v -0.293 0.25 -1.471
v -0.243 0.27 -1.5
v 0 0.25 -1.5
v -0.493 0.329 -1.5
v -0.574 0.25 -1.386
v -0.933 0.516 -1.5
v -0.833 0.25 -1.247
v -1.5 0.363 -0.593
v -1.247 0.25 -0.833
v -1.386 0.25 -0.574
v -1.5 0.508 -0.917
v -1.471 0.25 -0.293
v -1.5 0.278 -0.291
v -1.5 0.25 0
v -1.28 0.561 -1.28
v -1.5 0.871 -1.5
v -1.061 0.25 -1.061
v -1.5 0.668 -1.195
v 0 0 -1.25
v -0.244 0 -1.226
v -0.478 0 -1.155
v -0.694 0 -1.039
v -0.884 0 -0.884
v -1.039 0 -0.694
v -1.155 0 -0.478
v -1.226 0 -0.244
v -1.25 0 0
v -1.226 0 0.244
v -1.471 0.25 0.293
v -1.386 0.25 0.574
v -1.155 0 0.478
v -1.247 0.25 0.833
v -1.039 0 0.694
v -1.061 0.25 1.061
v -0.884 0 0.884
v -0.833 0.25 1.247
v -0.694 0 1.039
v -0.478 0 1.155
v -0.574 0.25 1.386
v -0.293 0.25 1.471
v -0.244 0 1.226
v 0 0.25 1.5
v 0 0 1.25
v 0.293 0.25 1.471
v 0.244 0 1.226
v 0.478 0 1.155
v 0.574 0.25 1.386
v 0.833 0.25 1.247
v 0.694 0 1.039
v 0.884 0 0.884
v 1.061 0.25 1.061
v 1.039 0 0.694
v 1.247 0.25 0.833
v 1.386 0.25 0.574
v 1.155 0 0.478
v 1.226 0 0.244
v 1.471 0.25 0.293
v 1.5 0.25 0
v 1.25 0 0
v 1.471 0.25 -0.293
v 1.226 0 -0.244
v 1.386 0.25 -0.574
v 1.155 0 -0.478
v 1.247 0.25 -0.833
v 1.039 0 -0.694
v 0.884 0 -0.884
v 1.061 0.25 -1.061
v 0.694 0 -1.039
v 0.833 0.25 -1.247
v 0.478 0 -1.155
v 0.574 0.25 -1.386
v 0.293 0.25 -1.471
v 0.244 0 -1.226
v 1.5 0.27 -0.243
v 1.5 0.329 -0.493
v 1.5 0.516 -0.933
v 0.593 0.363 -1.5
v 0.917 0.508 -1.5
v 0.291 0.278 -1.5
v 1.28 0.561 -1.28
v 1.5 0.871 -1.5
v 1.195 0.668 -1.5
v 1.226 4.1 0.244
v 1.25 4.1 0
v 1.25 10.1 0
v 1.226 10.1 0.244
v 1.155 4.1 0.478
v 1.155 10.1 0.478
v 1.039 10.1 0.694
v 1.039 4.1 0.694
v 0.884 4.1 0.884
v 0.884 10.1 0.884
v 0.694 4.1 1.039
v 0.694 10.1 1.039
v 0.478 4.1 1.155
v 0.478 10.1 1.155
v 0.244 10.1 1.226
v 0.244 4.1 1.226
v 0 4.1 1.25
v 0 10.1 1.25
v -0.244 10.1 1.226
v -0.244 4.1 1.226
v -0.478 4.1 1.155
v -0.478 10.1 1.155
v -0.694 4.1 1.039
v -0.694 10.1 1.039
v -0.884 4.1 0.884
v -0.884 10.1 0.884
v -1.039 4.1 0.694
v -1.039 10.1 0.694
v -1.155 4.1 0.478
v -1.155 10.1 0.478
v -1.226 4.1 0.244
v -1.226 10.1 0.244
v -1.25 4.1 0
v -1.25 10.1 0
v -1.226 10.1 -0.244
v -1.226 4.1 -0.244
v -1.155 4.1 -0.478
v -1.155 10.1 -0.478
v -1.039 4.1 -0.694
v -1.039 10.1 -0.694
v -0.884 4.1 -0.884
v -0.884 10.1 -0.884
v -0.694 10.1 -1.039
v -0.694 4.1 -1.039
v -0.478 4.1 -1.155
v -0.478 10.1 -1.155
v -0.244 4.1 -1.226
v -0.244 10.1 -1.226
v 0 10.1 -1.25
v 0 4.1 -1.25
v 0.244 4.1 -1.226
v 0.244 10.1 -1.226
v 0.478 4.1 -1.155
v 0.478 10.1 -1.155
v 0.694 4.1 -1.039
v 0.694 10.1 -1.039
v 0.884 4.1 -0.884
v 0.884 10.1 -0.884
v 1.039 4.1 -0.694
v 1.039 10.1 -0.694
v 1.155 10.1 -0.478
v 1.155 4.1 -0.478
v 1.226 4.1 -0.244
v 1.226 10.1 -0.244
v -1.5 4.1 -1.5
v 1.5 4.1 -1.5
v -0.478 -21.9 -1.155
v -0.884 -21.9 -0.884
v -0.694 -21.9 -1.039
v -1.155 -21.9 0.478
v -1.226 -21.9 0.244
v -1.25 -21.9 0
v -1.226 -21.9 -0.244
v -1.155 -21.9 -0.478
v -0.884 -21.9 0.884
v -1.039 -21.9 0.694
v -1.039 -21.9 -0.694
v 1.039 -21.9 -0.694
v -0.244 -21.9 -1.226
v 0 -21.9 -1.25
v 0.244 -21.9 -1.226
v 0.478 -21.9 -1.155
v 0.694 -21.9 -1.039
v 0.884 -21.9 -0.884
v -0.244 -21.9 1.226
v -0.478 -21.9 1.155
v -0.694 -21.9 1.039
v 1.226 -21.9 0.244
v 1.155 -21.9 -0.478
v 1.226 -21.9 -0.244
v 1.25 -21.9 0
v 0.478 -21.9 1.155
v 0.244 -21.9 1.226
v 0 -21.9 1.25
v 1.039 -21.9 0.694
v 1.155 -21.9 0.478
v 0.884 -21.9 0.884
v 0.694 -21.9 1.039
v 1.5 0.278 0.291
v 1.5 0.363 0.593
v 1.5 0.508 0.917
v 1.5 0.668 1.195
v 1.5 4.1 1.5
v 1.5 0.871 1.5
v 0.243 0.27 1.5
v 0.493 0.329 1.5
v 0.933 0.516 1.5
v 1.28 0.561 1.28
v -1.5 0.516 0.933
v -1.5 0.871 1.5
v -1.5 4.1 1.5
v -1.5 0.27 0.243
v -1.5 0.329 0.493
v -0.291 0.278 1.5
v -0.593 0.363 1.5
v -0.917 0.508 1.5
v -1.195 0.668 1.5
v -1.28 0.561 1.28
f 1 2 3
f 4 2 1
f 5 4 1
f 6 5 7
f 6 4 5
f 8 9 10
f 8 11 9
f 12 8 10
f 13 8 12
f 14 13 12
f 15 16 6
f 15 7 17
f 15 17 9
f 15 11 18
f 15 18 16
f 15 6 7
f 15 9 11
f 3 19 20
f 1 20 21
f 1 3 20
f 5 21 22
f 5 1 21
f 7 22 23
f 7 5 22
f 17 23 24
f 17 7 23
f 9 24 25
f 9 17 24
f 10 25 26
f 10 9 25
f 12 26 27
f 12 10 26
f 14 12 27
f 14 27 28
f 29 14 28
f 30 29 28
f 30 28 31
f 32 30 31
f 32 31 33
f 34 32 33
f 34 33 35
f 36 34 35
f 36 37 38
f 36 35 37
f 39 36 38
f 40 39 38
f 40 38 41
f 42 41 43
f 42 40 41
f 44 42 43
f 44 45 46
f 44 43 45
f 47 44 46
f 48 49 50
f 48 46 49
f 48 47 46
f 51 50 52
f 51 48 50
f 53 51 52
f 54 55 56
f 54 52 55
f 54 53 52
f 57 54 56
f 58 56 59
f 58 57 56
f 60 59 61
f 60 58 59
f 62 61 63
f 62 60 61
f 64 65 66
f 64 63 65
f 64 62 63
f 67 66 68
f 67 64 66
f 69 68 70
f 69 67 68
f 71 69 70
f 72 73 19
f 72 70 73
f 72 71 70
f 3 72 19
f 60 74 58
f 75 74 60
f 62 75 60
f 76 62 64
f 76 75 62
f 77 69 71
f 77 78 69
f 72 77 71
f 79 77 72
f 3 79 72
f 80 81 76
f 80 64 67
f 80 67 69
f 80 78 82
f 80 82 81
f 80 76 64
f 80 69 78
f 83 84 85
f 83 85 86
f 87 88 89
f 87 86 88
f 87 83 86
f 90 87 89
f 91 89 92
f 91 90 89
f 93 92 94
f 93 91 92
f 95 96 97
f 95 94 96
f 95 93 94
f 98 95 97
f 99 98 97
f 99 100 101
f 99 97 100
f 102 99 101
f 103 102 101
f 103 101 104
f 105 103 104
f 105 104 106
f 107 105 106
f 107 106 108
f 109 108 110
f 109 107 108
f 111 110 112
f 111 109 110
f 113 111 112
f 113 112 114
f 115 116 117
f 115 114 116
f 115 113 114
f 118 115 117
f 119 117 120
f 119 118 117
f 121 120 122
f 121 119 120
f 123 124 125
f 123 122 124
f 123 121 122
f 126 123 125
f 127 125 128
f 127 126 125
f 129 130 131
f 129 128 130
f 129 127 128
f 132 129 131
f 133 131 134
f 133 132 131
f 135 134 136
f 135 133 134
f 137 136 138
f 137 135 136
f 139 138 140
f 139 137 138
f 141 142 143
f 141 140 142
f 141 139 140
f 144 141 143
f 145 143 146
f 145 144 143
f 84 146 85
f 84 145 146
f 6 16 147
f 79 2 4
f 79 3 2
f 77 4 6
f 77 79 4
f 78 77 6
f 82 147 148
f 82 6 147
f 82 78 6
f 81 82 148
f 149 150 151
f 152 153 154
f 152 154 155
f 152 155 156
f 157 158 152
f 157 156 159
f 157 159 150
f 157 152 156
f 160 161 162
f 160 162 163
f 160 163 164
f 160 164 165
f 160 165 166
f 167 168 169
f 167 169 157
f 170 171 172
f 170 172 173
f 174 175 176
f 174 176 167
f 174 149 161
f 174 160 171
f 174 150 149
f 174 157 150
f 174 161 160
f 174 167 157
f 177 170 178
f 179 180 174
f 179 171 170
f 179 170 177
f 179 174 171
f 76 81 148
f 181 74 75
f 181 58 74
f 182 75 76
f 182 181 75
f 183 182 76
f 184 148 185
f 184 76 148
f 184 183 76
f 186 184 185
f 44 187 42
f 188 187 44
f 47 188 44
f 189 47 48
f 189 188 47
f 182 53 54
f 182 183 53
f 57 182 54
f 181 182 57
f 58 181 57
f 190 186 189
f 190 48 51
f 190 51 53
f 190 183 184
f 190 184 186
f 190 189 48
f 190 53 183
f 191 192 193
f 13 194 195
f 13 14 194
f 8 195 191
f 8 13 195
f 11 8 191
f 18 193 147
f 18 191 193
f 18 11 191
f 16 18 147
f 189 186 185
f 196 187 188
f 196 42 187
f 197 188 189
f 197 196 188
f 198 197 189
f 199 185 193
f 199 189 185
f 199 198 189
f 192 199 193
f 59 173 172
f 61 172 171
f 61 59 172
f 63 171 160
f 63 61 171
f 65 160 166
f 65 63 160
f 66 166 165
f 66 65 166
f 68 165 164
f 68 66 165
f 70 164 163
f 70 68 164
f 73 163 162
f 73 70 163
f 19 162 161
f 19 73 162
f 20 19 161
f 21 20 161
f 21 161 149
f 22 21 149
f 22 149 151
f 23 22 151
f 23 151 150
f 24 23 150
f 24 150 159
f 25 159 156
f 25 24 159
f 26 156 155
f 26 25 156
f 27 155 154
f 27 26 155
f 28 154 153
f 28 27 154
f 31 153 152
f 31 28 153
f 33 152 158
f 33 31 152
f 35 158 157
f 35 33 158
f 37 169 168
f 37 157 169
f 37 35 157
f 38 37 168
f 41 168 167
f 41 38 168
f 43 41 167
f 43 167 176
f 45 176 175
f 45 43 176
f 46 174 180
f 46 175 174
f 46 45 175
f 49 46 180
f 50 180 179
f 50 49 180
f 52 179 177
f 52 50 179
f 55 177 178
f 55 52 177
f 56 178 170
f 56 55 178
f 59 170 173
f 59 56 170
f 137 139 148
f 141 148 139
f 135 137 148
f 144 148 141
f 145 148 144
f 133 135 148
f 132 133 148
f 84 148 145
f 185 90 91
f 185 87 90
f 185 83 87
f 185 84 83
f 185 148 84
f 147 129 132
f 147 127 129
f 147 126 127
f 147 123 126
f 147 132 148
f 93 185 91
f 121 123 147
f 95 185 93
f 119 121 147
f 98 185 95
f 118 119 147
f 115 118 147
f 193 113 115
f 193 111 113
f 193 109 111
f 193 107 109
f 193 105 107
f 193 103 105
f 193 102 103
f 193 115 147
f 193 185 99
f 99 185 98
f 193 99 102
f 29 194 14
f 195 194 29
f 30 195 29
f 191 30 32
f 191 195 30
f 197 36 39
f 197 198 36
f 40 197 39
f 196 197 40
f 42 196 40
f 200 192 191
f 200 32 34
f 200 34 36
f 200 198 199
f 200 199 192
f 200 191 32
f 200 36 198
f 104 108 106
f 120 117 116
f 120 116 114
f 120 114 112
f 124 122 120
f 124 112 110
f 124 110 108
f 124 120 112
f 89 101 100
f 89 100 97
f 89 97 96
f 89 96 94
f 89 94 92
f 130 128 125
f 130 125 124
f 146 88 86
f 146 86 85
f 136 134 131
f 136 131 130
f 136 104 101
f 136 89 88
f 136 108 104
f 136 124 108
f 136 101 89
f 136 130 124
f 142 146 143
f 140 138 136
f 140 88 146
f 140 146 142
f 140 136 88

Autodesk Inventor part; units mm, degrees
ref_plane "YZ Plane" through (0, 0, 0) normal (1, 0, 0) x (0, 1, 0)
ref_plane "XZ Plane" through (0, 0, 0) normal (0, 1, 0) x (-1, 0, 0)
ref_plane "XY Plane" through (0, 0, 0) normal (0, 0, 1) x (1, 0, 0)
sketch "Sketch1" plane through (0, 0, 0) normal (0, 1, 0) x (-1, 0, 0)
  line L0 (-1.5, 1.5) -> (1.5, 1.5)
  line L1 (1.5, 1.5) -> (1.5, -1.5)
  line L2 (1.5, -1.5) -> (-1.5, -1.5)
  line L3 (-1.5, -1.5) -> (-1.5, 1.5)
  line L4 (-1.5, 1.5) -> (1.5, -1.5) construction
  line L5 (1.5, 1.5) -> (-1.5, -1.5) construction
  point P0 (0, 0)
  dimension "d0" = 3
  dimension "d1" = 3
extrude "Extrusion1" add sketch "Sketch1" along normal blind 4.1
sketch "Sketch2" plane through (0, 4.1, 0) normal (0, 1, 0) x (1, 0, 0)
  circle A0 centre (0, 0) radius 1.25
  dimension "d4" = 2.5
extrude "Extrusion2" add sketch "Sketch2" along normal blind 6
sketch "Sketch3" plane through (0, 0, 0) normal (0, -1, 0) x (1, 0, 0)
  circle A0 centre (0, 0) radius 1.25
  dimension "d7" = 2.5
extrude "Extrusion3" add sketch "Sketch3" along normal blind 21.9
thread "Thread1" size "M2.5x0.45" class "6g" standard "ISO Metric profile" length 6
thread "Thread2" size "M2.5x0.45" class "6g" standard "ISO Metric profile" length 10
sketch "Sketch4" plane through (0, 0, 0) normal (1, 0, 0) x (0, 1, 0)
  line L0 (0, 1.5) -> (4.1, 1.5) construction
  line L1 (4.1, 1.5) -> (4.1, 1.25) construction
  line L2 (4.1, 1.25) -> (10.1, 1.25) construction
  line L3 (10.1, 1.25) -> (10.1, -1.25) construction
  line L4 (10.1, -1.25) -> (4.1, -1.25) construction
  line L5 (4.1, -1.25) -> (4.1, -1.5) construction
  line L6 (4.1, -1.5) -> (0, -1.5) construction
  line L7 (0, -1.5) -> (0, -1.25) construction
  line L8 (0, -1.25) -> (-21.9, -1.25) construction
  line L9 (-21.9, -1.25) -> (-21.9, 1.25) construction
  line L10 (-21.9, 1.25) -> (0, 1.25) construction
  line L11 (0, 1.25) -> (0, 1.5) construction
  line L12 (0, -1.25) -> (0.25, -1.5)
  line L13 (0, -1.25) -> (0.3536, -1.25) construction
  line L14 (0, -1.25) -> (0, -1.5)
  line L15 (0, -1.5) -> (4.1, -1.5) projected
  line L16 (-28.3, 0) -> (16.5, 0) projected
  line L17 (0, -1.5) -> (0, -2.5685)
  line L18 (0, -2.5685) -> (0.9588, -2.2088)
  line L19 (0.9588, -2.2088) -> (0.25, -1.5)
  point P0 (0, 0)
  dimension "d15" = 45
revolve "Revolution1" cut sketch "Sketch4" angle 360 about axis through (0, -10, 0) along (0, 1, 0)
properties part number "500-001" material "Steel"
